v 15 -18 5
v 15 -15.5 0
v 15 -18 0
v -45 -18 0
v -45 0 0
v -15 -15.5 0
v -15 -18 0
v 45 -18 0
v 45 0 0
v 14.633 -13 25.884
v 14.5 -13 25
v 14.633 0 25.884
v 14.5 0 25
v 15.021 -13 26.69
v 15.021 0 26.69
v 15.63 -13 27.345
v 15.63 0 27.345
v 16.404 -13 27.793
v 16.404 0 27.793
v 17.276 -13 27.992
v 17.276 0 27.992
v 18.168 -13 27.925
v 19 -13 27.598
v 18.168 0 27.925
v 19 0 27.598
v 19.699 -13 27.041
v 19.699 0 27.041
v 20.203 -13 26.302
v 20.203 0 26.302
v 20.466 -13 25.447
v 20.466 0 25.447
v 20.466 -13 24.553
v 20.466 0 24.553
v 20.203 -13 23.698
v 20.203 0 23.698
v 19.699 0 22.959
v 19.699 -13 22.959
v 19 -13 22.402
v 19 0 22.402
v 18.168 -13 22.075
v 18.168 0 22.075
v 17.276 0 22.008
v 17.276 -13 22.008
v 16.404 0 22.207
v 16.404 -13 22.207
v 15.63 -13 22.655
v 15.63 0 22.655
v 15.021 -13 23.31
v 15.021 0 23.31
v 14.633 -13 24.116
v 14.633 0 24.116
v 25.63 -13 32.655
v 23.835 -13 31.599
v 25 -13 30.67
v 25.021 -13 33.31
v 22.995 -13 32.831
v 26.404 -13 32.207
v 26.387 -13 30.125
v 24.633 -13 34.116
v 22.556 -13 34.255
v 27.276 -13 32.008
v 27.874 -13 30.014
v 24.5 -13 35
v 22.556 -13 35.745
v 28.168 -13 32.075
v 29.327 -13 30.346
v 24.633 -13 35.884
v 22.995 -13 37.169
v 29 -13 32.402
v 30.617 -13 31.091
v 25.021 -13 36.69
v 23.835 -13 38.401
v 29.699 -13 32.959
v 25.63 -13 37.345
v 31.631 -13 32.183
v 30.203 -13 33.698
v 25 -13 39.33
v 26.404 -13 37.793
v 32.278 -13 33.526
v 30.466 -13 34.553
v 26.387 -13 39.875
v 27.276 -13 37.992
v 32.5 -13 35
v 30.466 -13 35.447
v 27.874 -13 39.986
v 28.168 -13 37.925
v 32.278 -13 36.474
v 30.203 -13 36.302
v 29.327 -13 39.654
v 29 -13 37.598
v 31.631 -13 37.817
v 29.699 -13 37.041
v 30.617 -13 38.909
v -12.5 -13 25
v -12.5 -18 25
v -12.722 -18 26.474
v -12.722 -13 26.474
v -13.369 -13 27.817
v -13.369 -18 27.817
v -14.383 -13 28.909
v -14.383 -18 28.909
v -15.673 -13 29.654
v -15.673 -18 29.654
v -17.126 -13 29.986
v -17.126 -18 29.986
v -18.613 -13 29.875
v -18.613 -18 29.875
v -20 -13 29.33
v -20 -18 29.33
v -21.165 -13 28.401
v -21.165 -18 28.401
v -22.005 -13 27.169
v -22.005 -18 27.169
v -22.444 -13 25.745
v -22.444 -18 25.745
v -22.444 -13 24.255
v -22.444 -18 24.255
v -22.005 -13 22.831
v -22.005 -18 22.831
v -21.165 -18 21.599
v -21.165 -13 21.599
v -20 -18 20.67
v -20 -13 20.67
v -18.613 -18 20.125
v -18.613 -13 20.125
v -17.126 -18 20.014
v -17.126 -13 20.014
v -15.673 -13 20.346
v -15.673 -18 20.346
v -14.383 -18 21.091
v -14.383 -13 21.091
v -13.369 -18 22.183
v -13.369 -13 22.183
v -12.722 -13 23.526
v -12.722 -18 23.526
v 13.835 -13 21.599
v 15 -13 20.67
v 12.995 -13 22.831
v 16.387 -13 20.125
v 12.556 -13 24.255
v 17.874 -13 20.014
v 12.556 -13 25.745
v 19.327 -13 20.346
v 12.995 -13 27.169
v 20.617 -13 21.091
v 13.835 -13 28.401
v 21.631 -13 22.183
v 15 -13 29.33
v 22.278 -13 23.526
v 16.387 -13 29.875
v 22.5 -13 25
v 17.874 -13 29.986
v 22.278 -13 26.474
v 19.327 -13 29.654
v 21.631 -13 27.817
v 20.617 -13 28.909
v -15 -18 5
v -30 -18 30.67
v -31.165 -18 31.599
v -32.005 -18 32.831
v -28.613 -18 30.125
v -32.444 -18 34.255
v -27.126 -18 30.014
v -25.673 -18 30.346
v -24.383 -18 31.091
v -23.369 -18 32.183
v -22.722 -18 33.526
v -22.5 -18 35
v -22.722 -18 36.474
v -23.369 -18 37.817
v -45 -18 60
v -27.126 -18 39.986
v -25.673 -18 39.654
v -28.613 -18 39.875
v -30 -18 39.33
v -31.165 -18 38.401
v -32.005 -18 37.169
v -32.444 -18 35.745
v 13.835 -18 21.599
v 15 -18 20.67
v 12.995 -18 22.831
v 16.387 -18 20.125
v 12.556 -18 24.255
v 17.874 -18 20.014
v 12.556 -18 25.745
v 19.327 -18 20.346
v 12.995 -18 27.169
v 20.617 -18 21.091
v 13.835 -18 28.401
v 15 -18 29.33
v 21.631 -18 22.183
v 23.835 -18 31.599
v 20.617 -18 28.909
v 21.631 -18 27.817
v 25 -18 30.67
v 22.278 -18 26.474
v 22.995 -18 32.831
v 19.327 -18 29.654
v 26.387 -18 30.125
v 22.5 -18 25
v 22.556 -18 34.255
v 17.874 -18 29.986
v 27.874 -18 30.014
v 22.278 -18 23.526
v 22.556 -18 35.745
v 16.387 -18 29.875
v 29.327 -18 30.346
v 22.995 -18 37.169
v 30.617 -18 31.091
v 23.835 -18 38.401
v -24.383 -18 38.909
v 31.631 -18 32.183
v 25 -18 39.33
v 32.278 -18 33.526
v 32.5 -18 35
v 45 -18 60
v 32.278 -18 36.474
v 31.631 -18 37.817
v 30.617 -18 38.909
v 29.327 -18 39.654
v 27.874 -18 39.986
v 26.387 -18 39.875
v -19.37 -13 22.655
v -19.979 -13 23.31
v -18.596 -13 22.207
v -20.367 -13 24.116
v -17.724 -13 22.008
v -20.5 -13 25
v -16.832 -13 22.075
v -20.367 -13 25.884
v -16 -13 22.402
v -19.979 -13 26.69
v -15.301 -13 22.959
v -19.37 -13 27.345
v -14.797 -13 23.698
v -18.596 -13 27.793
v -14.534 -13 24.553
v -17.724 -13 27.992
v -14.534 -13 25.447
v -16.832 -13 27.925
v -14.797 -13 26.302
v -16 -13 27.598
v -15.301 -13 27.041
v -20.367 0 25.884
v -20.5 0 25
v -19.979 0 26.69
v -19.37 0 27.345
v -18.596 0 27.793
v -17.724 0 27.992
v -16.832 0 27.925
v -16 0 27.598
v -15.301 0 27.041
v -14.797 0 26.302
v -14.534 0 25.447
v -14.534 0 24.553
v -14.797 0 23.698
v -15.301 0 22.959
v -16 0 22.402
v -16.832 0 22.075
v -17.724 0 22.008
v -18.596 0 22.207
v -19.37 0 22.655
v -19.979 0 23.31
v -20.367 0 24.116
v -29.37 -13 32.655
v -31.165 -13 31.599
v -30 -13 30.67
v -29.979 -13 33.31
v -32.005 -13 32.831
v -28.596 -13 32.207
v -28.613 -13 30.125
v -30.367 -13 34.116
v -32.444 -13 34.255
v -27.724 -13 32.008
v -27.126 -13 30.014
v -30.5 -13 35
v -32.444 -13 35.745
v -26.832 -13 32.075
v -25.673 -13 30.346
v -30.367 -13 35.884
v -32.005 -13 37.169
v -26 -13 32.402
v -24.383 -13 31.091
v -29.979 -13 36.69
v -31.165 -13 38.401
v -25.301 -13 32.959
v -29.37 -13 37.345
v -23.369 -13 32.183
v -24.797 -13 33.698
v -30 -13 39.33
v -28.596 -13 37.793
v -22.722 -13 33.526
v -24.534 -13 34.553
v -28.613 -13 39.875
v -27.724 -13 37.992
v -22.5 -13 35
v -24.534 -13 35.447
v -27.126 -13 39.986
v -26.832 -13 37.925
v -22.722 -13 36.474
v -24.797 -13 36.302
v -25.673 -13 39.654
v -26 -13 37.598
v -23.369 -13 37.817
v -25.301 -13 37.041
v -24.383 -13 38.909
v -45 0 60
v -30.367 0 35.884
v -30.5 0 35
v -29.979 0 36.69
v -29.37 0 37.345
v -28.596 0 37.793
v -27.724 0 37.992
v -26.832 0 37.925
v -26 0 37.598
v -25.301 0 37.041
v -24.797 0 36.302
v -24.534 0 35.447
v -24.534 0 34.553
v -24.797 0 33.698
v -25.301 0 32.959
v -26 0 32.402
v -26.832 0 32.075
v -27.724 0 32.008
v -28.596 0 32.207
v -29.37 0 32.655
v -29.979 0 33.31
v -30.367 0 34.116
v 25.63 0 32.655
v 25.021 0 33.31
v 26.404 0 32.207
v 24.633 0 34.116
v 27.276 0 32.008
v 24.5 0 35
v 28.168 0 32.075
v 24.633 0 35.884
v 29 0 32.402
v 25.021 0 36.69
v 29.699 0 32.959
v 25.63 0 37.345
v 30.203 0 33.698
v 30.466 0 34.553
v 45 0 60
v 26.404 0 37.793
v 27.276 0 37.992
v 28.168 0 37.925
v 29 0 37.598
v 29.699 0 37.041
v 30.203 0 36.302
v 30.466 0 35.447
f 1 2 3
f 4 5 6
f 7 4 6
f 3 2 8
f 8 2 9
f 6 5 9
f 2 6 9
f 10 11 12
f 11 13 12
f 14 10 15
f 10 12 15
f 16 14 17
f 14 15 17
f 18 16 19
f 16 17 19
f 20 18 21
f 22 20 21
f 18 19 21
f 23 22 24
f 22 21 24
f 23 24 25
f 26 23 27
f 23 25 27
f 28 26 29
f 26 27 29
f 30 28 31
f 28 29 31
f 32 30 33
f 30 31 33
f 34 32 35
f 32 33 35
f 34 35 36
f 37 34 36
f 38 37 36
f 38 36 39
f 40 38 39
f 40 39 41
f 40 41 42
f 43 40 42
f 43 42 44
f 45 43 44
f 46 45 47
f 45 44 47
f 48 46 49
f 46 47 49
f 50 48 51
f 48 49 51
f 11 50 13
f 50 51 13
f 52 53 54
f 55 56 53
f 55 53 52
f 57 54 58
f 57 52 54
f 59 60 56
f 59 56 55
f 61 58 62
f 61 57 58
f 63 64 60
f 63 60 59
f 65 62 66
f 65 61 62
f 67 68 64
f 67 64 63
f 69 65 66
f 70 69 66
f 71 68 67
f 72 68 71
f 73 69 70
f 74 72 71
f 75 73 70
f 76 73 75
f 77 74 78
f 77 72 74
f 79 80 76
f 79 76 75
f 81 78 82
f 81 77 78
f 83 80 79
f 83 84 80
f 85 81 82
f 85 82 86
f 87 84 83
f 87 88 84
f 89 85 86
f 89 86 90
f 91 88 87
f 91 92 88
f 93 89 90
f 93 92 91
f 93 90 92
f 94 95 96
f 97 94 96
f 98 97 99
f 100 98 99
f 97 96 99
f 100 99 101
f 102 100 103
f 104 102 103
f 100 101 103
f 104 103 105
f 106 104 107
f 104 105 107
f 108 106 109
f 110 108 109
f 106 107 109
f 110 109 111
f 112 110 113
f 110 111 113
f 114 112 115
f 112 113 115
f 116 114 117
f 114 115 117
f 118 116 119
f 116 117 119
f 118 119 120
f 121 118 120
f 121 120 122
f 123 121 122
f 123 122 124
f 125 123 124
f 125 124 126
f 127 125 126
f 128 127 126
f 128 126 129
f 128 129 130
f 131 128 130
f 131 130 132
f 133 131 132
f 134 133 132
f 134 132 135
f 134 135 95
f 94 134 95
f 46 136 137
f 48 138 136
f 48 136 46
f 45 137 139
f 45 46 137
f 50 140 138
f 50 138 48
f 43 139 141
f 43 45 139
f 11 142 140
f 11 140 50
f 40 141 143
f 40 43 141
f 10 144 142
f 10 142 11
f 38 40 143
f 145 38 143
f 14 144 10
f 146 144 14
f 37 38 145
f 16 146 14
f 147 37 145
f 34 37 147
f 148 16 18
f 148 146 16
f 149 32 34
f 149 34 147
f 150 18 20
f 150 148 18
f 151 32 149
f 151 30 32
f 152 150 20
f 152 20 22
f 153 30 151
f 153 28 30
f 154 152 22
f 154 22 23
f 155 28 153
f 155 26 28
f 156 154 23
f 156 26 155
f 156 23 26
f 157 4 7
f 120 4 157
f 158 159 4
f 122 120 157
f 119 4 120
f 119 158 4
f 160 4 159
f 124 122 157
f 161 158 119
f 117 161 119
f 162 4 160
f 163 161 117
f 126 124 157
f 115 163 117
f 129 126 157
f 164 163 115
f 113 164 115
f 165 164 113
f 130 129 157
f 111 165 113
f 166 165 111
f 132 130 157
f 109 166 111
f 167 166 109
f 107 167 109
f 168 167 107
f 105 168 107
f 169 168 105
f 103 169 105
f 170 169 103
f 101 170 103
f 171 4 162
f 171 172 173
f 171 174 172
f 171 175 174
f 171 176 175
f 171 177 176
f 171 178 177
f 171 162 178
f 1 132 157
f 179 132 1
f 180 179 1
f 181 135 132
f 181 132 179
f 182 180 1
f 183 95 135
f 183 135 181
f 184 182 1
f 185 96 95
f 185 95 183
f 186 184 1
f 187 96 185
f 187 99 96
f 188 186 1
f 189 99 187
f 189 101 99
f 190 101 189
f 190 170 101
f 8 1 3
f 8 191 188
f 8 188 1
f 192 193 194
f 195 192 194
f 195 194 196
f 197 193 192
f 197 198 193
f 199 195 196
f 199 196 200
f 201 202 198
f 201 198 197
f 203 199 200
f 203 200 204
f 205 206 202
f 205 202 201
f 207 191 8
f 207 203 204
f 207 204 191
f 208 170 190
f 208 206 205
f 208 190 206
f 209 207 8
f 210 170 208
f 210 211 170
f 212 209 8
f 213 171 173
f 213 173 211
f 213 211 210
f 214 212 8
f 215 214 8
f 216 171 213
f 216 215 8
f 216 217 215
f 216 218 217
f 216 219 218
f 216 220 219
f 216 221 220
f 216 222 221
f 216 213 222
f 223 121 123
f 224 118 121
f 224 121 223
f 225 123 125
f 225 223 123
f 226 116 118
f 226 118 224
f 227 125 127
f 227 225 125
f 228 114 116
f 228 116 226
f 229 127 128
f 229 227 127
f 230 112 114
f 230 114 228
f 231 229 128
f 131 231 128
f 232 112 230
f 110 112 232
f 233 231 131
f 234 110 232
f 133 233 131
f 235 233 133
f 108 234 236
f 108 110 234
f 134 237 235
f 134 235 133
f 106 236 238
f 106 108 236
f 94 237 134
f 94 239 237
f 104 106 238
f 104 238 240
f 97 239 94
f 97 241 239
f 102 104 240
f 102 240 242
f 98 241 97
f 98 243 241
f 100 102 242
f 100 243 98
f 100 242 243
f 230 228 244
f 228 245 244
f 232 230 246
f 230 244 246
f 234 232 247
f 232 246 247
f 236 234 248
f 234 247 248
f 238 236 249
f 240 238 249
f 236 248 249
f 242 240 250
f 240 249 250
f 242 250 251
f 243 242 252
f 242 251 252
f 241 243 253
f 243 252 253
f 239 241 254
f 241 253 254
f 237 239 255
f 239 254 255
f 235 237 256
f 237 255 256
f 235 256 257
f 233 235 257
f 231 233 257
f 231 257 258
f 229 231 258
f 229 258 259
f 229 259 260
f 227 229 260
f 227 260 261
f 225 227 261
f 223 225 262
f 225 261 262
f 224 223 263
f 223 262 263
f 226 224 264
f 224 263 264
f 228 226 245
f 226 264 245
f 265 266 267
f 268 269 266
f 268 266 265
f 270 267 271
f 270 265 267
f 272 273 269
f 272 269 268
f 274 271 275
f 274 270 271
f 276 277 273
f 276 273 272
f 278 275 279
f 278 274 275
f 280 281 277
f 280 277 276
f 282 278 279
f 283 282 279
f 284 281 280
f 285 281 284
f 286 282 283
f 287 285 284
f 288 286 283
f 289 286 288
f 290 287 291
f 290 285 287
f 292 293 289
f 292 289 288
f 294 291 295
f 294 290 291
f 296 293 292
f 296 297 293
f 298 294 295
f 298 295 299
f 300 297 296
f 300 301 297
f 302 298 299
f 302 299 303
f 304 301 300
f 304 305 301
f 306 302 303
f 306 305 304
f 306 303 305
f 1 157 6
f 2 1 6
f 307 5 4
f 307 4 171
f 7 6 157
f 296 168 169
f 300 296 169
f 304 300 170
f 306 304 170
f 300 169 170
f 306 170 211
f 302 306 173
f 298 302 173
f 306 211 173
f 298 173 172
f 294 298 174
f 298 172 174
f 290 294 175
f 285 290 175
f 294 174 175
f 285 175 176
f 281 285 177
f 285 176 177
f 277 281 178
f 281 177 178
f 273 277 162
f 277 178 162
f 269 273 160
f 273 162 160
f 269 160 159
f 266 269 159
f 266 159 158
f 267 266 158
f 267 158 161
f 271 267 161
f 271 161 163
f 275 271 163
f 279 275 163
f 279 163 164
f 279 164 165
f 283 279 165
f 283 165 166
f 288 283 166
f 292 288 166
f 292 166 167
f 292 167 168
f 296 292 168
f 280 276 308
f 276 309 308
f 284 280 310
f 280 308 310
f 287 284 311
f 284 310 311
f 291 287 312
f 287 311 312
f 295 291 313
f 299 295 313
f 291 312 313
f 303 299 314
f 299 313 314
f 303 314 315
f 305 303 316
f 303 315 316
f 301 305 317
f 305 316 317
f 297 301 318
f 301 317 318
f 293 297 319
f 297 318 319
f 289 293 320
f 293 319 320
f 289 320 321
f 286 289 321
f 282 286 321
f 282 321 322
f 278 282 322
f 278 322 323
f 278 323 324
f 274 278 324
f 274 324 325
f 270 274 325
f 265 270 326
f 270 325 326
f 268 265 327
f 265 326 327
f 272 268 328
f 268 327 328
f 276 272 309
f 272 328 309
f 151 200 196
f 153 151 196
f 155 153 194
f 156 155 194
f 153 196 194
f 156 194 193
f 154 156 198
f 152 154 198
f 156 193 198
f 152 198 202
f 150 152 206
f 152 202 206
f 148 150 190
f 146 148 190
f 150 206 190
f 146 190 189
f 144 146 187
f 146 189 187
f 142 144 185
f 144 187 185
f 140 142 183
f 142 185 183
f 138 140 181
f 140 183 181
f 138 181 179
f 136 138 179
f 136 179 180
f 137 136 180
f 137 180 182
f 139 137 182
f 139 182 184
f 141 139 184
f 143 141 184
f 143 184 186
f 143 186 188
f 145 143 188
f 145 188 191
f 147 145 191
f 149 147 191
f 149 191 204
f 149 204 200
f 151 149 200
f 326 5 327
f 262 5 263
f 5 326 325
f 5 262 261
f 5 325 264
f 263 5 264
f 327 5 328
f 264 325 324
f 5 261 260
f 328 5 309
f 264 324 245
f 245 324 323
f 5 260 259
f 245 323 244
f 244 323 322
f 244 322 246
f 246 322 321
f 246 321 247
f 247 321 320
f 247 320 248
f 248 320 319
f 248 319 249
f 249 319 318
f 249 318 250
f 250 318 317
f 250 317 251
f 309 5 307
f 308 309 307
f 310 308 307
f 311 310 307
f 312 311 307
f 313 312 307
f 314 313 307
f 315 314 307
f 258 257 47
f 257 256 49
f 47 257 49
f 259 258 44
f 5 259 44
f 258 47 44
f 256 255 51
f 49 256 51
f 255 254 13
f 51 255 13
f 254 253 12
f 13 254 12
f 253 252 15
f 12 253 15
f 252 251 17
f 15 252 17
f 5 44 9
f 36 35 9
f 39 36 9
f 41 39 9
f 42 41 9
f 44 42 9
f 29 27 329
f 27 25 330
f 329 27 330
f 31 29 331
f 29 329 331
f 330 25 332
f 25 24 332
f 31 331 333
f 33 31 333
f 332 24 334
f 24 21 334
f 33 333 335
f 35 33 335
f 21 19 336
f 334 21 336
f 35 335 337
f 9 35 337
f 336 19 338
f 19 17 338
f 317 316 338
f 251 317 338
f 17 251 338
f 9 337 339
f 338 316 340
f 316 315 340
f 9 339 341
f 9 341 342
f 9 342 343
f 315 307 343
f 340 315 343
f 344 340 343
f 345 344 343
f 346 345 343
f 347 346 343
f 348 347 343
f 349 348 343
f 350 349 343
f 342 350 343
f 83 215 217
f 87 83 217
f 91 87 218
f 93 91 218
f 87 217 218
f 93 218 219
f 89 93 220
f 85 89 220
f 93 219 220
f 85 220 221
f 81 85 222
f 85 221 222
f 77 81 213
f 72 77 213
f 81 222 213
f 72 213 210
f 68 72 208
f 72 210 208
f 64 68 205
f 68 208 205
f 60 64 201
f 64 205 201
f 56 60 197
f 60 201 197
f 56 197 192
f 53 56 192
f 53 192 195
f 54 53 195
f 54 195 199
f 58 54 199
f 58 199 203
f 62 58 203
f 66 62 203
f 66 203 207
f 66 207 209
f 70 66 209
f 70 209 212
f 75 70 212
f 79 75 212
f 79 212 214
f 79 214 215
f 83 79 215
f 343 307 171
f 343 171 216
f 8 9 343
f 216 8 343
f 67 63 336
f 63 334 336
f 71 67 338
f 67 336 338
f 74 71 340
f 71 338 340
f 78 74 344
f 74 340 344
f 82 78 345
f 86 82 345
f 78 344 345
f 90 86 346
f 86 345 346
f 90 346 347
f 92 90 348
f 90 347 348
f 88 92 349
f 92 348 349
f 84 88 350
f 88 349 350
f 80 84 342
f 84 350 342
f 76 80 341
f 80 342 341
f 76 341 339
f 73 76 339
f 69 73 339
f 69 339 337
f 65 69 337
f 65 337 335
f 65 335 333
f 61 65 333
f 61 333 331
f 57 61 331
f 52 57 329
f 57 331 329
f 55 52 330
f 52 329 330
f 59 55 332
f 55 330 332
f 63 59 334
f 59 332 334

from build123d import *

# Parameters (mm, degrees)
F0_W           = 90
F0_H           = 60
F1_DEPTH       = 18
F3_D           = 6
F3_CBORE_D     = 10
F3_CBORE_DEPTH = 5
F7_DEPTH       = 30


with BuildPart() as f1:
    # F0 (on Front) → F1 (new body)
    with BuildSketch(Plane.XZ):
        with Locations((0, 30)):
            Rectangle(F0_W, F0_H)
    extrude(amount=F1_DEPTH)

    # F3 (through all)
    with Locations(Plane.XZ.offset(18)):
        with Locations((-27.5, 35), (-17.5, 25), (17.5, 25), (27.5, 35)):
            CounterBoreHole(F3_D / 2, F3_CBORE_D / 2, F3_CBORE_DEPTH)

    # F6 (on offset) → F7 (cut, through all)
    with BuildSketch(Plane(origin=(-15, 0, 0), x_dir=(0, -1, 0), z_dir=(-1, 0, 0))):
        Polygon((15.5, 0), (18, 0), (18, 5), align=None)
    extrude(amount=-F7_DEPTH, mode=Mode.SUBTRACT)


solid = f1.part
